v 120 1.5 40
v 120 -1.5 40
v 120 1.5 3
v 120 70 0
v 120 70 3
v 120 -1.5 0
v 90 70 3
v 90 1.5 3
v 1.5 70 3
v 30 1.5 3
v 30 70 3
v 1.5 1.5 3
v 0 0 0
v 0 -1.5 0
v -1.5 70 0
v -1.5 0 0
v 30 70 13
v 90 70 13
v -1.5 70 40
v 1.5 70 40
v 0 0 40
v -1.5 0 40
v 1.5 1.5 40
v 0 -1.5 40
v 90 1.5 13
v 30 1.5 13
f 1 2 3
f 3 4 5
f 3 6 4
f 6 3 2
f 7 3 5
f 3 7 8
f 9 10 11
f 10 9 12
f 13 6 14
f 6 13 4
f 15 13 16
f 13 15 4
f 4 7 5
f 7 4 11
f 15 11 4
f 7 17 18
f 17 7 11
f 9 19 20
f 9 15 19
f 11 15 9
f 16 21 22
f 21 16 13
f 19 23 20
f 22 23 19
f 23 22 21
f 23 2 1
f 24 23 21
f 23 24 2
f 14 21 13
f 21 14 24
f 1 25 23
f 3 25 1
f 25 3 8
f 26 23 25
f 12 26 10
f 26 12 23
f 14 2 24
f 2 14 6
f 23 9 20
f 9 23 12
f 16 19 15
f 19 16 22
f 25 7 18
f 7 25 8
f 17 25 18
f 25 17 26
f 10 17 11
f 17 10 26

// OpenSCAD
$fn = 64;

// --- Dimensions (mm) ---
outer_x = 120;
outer_y = 70;
outer_z = 40;
wall_thick = 3;
floor_thick = 3;

// Platform Dimensions
platform_x = 60;
platform_z = 10; // Height above inner floor
platform_z_pos = 13; // Inner floor is at 3, so top is at 3+10 = 13

// Electrode Holes
hole_dia = 2;
hole_z = 30;
hole_y = 0;

// Derived Dimensions
inner_x = outer_x - (wall_thick * 2);
inner_y = outer_y - (wall_thick * 2);
inner_z = outer_z - floor_thick;

// --- Main Body ---
union() {
    // Floor
    translate([0, 0, 0])
    cube([outer_x, outer_y, floor_thick]);

    // Walls
    // Front/Back (Y direction)
    translate([0, -wall_thick/2, 0])
    cube([outer_x, wall_thick, outer_z]);
    
    // Left/Right (X direction)
    translate([-wall_thick/2, 0, 0])
    cube([wall_thick, outer_y, outer_z]);

    // Platform
    translate([(outer_x - platform_x)/2, 0, floor_thick])
    cube([platform_x, outer_y, platform_z]);
}

// --- Cavity (Buffer Chambers) ---
difference() {
    // Subtract the void from the solid
    union() {
        // Inner Floor Void
        translate([0, 0, 0])
        cube([inner_x, inner_y, floor_thick]);
        
        // Inner Walls Void
        // Front/Back
        translate([0, -wall_thick/2, 0])
        cube([inner_x, wall_thick, outer_z]);
        
        // Left/Right
        translate([-wall_thick/2, 0, 0])
        cube([wall_thick, inner_y, outer_z]);
        
        // Platform Void
        translate([(outer_x - platform_x)/2, 0, floor_thick])
        cube([platform_x, outer_y, platform_z]);
    }

    // Electrode Holes (Left End)
    translate([-wall_thick/2, hole_y, hole_z])
    cylinder(d = hole_dia, h = wall_thick + 0.5);

    // Electrode Holes (Right End)
    translate([outer_x - wall_thick/2, hole_y, hole_z])
    cylinder(d = hole_dia, h = wall_thick + 0.5);
}
